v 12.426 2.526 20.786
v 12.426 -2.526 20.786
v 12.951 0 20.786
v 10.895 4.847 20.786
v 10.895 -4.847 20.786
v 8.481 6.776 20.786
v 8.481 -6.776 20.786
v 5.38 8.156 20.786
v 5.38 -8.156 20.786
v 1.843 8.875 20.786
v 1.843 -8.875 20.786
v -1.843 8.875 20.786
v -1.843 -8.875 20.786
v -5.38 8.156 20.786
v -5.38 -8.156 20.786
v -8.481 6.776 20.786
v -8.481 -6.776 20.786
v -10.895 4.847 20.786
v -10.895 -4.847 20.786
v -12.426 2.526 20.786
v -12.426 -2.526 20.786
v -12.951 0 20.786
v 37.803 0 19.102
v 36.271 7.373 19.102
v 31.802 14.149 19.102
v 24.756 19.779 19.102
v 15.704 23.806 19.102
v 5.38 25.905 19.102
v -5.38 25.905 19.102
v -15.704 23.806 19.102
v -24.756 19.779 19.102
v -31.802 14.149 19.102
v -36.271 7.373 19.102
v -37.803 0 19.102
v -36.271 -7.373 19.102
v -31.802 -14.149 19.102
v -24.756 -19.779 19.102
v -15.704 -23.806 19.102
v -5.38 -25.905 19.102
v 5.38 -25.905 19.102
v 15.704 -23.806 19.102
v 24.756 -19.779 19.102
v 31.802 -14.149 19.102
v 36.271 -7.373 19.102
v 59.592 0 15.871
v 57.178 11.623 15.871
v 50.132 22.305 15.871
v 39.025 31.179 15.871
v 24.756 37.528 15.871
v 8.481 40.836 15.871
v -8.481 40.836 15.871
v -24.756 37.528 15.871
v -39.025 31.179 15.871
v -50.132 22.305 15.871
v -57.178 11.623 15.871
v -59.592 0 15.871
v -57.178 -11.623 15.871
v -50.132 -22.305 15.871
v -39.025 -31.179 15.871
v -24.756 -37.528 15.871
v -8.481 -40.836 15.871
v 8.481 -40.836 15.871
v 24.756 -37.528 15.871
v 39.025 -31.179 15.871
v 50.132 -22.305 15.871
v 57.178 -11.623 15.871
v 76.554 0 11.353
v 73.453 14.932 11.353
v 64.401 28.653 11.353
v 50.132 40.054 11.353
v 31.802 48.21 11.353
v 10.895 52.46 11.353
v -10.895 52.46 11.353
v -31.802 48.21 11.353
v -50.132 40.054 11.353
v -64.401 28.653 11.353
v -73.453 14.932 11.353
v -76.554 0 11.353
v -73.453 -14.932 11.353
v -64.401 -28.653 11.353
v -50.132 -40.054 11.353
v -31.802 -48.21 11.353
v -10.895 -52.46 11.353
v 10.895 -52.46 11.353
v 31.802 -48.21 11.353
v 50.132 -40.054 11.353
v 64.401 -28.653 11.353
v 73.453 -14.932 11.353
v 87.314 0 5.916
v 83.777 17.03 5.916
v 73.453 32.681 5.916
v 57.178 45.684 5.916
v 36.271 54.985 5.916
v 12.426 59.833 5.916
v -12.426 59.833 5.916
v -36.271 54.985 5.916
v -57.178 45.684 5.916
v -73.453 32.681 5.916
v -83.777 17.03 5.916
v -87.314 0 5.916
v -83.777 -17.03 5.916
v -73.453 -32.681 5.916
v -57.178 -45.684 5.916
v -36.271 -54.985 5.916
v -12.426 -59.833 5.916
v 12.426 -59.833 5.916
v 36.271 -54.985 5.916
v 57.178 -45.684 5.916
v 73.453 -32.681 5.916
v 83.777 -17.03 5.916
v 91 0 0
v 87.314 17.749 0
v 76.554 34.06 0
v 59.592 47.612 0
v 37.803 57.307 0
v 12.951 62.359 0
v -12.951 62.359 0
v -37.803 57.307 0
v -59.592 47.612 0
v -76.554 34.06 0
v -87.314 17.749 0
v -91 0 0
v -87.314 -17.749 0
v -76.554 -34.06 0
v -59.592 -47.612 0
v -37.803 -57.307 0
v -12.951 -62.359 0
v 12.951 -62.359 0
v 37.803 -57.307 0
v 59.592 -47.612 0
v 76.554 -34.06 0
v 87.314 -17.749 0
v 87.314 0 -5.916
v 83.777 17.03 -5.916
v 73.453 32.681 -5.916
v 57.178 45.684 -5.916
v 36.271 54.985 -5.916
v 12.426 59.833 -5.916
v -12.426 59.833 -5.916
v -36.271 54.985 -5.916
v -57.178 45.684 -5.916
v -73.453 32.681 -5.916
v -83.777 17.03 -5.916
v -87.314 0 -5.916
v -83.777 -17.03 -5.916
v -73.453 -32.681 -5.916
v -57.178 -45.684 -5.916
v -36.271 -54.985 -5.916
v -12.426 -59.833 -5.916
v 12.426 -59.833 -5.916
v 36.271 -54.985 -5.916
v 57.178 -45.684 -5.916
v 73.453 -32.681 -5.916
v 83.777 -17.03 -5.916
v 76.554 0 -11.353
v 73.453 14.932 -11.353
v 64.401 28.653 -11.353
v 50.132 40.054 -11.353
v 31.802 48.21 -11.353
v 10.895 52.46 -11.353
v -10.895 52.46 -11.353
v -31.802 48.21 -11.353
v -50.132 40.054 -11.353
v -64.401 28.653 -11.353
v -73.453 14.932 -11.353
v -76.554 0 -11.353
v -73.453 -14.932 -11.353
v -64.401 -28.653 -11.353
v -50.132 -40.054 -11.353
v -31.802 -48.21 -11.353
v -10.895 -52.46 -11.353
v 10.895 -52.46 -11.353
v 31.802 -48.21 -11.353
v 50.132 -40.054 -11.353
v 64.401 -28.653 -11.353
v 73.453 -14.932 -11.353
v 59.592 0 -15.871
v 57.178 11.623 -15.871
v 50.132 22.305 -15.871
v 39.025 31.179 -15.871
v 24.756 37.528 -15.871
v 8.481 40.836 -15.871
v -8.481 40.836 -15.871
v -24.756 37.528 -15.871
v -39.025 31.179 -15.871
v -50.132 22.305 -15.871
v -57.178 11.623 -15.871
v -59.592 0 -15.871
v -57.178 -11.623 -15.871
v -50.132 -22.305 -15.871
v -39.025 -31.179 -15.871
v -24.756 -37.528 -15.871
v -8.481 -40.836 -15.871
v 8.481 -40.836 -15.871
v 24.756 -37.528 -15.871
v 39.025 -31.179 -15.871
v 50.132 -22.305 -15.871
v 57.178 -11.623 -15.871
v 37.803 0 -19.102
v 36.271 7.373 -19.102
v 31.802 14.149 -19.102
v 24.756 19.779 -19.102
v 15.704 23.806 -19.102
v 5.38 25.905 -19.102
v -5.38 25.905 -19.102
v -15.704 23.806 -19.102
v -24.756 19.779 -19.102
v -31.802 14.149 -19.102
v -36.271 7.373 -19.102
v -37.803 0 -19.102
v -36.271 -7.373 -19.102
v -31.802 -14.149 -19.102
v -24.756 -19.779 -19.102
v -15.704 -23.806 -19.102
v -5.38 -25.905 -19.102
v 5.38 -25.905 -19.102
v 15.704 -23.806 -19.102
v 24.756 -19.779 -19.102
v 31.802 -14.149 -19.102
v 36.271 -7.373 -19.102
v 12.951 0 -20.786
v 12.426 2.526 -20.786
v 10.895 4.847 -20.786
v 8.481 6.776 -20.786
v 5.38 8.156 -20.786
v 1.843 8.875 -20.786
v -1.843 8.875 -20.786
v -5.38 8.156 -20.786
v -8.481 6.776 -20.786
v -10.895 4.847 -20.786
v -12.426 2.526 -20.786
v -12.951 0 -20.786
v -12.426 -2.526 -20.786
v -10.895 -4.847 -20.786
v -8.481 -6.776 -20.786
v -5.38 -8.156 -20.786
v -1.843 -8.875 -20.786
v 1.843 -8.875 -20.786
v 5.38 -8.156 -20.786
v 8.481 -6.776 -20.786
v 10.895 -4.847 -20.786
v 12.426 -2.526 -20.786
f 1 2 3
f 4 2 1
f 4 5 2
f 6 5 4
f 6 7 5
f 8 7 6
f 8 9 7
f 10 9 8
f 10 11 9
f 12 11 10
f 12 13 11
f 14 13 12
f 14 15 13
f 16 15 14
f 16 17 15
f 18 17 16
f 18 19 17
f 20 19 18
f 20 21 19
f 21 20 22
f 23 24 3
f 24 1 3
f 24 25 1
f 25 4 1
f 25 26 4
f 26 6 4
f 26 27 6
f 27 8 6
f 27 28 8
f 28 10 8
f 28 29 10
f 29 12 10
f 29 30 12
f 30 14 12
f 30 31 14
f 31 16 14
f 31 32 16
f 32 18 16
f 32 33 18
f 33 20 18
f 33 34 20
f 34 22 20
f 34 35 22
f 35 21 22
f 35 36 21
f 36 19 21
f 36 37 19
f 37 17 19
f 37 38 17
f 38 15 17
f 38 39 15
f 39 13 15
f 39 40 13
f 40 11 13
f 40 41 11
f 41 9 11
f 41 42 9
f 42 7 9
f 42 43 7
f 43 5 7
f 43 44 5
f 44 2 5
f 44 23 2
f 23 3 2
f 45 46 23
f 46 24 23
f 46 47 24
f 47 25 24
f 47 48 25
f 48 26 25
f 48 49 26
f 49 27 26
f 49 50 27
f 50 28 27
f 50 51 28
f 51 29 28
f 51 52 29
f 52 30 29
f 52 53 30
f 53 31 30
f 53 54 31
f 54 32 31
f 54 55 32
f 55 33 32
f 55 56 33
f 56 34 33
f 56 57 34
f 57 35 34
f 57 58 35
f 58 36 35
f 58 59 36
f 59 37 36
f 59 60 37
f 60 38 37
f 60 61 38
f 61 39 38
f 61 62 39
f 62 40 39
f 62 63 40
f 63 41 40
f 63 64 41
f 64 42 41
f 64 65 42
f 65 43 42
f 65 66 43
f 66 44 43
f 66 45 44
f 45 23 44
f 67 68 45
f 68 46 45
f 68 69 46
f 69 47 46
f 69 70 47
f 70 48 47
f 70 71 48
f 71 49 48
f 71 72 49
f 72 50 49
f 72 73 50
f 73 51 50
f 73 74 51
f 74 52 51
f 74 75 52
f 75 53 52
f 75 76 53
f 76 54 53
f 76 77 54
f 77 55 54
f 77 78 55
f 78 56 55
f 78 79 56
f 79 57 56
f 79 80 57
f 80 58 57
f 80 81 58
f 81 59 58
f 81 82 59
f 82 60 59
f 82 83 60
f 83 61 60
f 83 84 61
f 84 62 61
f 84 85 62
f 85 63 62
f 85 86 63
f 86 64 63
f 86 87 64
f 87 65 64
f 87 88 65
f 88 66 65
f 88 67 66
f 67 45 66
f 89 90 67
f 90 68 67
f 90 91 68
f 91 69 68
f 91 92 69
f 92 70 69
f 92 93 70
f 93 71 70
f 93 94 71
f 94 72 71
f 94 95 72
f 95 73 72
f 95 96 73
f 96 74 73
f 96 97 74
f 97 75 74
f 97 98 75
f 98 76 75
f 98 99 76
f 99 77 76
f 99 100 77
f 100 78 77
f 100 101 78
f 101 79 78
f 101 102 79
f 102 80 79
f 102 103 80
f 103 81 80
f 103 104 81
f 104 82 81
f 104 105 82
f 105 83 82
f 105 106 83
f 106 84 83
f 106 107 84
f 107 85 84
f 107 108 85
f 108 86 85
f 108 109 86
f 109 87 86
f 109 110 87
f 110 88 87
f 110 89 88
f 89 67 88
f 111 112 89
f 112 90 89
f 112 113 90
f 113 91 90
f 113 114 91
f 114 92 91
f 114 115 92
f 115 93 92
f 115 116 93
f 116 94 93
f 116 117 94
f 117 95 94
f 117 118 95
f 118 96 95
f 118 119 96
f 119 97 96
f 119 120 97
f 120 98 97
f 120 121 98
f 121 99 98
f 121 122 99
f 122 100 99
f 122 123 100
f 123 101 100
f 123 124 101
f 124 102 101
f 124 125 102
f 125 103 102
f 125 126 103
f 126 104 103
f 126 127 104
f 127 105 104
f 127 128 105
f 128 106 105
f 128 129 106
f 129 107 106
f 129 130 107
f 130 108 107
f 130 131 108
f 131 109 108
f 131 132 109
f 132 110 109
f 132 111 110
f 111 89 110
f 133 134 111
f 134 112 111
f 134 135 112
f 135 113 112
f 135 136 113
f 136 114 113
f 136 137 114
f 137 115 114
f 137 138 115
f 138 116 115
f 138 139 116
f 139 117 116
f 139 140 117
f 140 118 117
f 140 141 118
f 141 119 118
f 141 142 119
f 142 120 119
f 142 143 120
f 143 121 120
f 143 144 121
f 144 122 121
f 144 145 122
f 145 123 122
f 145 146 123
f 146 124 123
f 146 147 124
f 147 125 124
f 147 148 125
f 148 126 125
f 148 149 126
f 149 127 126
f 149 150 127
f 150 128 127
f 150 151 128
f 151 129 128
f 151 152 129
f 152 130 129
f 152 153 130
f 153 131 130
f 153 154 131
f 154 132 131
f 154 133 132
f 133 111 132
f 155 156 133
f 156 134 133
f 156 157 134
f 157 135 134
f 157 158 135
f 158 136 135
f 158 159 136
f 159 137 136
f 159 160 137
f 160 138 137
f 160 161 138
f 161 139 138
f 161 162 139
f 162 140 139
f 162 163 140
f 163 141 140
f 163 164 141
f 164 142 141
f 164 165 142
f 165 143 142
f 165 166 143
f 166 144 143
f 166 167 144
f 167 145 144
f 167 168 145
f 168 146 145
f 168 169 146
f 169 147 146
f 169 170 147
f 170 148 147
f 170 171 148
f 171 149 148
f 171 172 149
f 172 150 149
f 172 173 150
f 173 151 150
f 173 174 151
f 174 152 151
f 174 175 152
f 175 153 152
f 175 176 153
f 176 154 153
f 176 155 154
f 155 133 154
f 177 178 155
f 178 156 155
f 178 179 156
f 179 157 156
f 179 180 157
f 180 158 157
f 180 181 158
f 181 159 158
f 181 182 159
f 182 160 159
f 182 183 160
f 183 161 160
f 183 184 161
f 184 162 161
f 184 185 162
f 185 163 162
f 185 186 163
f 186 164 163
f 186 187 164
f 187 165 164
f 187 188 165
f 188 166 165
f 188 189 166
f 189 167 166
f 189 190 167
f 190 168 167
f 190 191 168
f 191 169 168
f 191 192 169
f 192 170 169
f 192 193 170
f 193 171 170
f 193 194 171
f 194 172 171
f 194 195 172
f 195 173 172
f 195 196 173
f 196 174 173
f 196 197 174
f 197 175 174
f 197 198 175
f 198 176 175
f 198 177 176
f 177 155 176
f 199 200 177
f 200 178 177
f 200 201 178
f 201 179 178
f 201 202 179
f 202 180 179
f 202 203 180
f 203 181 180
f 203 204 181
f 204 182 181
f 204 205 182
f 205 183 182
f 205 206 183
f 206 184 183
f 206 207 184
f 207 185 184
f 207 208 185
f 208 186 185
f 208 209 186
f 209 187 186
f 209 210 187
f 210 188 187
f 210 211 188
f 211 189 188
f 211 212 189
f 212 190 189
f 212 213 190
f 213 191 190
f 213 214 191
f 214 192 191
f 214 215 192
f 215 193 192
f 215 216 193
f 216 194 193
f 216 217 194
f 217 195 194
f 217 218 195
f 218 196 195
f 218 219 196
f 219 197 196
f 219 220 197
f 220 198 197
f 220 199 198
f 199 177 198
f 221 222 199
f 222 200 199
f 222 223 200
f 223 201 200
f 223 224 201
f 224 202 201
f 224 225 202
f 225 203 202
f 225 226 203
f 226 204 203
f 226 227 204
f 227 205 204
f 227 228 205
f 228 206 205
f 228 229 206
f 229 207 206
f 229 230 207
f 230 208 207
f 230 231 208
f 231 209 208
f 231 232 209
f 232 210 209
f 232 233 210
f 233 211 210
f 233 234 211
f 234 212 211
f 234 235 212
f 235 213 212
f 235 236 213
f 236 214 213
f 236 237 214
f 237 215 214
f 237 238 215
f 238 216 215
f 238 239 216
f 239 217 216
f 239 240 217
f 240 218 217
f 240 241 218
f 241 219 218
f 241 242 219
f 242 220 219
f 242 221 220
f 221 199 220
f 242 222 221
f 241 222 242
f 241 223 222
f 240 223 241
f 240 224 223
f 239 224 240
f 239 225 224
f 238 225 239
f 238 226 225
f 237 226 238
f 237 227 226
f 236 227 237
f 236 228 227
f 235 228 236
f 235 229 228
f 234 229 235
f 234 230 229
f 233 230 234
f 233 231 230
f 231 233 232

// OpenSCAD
// Generated by SolidPython 1.0.1 on 2020-07-29 00:46:50


scale(v = [13, 9, 3]) {
	sphere(r = 7);
}
/***********************************************
*********      SolidPython code:      **********
************************************************
 
# import packages: SolidPython
from solid import *
from solid.utils import *
from itertools import chain, combinations, permutations


class Resize:

    def __init__(self, scad_file):
        self.scad_file = scad_file
        #self.scad_file = import_scad(scad_file)
        # cone/cylinder param:
        self.r1 = 0
        self.r2 = 0
        self.h = 0
        # rectangular prism param:
        self.w = 0
        self.l = 0
        # ellipse param:
        self.r = 0

    # import OpenScad code (file name corresponds to shape)


    # classify shape + parameters
    def assign(self, param1, param2, param3):
        if self.scad_file == 'cone.scad':
            self.r1 = param1
            self.r2 = param2
            self.h = param3
        elif self.scad_file == 'cylinder.scad':
            self.r1 = param1
            self.r2 = param2
            self.h = param3
        elif self.scad_file == 'rectangularPrism.scad':
            self.h = param1
            self.l = param2
            self.w = param3
        else:
            self.r = param1
            self.h = param2

    # resize parameters
    def iterate(self):
        x = range(3, 20, 2)
        i = 1
        if self.scad_file == 'cone.scad':
            tempList = list(permutations(x, 2))
            for temp in tempList:
                param1 = temp[0]
                param2 = temp[1]
                filepath = 'produced_scad_files/' + 'cone' + str(param1) + '_' + str(param2) + '_' + '.scad'
                scad_render_to_file(cylinder(h=param1, r1=param2, r2=0), filepath)

        elif self.scad_file == 'cylinder.scad':
            tempList = list(permutations(x, 3))
            for temp in tempList:
                param1 = temp[0]
                param2 = temp[1]
                filepath = 'produced_scad_files/' + 'cylinder' + str(param1) + '_' + str(param2) + '_' + '.scad'
                scad_render_to_file(cylinder(h=param1, r1=param2, r2=param2), filepath)

        elif self.scad_file == 'rectangularPrism.scad':
            tempList = list(permutations(x, 3))
            for temp in tempList:
                param1 = temp[0]
                param2 = temp[1]
                param3 = temp[2]
                filepath = 'produced_scad_files/' + 'rectangularPrism' + str(param1) + '_' + str(param2) + '_' + str(
                    param3) + '.scad'
                scad_render_to_file(cube(size=(param1, param2, param3)), filepath)

        elif self.scad_file == 'ellipse.scad':
            tempList = list(permutations(x, 4))
            for temp in tempList:
                param1 = temp[0]
                param2 = temp[1]
                param3 = temp[2]
                param4 = temp[3]
                filepath = 'produced_scad_files/' + 'ellipse' + str(param1) + '_' + str(param2) + '_' + str(param3) + '_' + str(param4) + '.scad'
                scad_render_to_file(scale([param1, param2, param3])(sphere(r=param4)), filepath)

    def render_to_scadfile(self):
        scad_render_to_file(scad, 'example.scad') 
 
************************************************/
